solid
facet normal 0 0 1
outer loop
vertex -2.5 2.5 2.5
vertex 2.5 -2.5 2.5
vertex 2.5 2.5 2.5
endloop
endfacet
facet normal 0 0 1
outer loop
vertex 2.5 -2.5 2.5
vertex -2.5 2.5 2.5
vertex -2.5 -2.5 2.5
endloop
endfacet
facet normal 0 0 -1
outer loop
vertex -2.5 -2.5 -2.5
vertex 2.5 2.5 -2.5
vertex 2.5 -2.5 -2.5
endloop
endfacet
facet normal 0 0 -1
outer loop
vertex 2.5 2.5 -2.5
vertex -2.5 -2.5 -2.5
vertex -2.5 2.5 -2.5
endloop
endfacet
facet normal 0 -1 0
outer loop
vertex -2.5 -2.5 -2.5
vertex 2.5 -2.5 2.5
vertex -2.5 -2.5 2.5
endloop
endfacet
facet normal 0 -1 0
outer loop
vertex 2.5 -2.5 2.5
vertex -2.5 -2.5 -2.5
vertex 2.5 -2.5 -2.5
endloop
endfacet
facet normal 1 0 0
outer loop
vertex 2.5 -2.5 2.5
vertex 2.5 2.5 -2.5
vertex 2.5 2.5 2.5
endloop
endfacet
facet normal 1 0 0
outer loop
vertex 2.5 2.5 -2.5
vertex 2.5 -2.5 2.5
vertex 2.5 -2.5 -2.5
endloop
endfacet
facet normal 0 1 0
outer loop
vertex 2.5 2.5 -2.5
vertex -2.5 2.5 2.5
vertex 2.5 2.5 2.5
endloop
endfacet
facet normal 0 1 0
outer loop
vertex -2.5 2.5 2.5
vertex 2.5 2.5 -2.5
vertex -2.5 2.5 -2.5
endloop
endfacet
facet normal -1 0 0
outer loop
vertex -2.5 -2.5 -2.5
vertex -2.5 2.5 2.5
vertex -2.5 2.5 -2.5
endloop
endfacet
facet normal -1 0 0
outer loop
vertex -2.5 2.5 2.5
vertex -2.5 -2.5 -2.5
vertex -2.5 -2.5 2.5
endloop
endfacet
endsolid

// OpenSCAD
/*
 * OpenSCAD Workshop Examples
 * Copyright (c) 2013 Anar Software LLC. < http://anars.com >
 *
 * This program is free software: you can redistribute it and/or modify it under
 * the terms of the GNU General Public License as published by the Free Software
 * Foundation, either version 3 of the License, or (at your option) any later
 * version.
 *
 * This program is distributed in the hope that it will be useful, but WITHOUT
 * ANY WARRANTY; without even the implied warranty of MERCHANTABILITY or FITNESS
 * FOR A PARTICULAR PURPOSE. See the GNU General Public License for more details.
 *
 * You should have received a copy of the GNU General Public License along with
 * this program. If not, see < http://www.gnu.org/licenses/ >
 *
 */
/*

Creates a cube. If true, object is centered at (0,0,0). Otherwise, the cube is placed in the positive quadrant with one corner at (0,0,0).


Parameters :

	cube(size = x, center = boolean);

*/

cube(size = 5, center = true);
